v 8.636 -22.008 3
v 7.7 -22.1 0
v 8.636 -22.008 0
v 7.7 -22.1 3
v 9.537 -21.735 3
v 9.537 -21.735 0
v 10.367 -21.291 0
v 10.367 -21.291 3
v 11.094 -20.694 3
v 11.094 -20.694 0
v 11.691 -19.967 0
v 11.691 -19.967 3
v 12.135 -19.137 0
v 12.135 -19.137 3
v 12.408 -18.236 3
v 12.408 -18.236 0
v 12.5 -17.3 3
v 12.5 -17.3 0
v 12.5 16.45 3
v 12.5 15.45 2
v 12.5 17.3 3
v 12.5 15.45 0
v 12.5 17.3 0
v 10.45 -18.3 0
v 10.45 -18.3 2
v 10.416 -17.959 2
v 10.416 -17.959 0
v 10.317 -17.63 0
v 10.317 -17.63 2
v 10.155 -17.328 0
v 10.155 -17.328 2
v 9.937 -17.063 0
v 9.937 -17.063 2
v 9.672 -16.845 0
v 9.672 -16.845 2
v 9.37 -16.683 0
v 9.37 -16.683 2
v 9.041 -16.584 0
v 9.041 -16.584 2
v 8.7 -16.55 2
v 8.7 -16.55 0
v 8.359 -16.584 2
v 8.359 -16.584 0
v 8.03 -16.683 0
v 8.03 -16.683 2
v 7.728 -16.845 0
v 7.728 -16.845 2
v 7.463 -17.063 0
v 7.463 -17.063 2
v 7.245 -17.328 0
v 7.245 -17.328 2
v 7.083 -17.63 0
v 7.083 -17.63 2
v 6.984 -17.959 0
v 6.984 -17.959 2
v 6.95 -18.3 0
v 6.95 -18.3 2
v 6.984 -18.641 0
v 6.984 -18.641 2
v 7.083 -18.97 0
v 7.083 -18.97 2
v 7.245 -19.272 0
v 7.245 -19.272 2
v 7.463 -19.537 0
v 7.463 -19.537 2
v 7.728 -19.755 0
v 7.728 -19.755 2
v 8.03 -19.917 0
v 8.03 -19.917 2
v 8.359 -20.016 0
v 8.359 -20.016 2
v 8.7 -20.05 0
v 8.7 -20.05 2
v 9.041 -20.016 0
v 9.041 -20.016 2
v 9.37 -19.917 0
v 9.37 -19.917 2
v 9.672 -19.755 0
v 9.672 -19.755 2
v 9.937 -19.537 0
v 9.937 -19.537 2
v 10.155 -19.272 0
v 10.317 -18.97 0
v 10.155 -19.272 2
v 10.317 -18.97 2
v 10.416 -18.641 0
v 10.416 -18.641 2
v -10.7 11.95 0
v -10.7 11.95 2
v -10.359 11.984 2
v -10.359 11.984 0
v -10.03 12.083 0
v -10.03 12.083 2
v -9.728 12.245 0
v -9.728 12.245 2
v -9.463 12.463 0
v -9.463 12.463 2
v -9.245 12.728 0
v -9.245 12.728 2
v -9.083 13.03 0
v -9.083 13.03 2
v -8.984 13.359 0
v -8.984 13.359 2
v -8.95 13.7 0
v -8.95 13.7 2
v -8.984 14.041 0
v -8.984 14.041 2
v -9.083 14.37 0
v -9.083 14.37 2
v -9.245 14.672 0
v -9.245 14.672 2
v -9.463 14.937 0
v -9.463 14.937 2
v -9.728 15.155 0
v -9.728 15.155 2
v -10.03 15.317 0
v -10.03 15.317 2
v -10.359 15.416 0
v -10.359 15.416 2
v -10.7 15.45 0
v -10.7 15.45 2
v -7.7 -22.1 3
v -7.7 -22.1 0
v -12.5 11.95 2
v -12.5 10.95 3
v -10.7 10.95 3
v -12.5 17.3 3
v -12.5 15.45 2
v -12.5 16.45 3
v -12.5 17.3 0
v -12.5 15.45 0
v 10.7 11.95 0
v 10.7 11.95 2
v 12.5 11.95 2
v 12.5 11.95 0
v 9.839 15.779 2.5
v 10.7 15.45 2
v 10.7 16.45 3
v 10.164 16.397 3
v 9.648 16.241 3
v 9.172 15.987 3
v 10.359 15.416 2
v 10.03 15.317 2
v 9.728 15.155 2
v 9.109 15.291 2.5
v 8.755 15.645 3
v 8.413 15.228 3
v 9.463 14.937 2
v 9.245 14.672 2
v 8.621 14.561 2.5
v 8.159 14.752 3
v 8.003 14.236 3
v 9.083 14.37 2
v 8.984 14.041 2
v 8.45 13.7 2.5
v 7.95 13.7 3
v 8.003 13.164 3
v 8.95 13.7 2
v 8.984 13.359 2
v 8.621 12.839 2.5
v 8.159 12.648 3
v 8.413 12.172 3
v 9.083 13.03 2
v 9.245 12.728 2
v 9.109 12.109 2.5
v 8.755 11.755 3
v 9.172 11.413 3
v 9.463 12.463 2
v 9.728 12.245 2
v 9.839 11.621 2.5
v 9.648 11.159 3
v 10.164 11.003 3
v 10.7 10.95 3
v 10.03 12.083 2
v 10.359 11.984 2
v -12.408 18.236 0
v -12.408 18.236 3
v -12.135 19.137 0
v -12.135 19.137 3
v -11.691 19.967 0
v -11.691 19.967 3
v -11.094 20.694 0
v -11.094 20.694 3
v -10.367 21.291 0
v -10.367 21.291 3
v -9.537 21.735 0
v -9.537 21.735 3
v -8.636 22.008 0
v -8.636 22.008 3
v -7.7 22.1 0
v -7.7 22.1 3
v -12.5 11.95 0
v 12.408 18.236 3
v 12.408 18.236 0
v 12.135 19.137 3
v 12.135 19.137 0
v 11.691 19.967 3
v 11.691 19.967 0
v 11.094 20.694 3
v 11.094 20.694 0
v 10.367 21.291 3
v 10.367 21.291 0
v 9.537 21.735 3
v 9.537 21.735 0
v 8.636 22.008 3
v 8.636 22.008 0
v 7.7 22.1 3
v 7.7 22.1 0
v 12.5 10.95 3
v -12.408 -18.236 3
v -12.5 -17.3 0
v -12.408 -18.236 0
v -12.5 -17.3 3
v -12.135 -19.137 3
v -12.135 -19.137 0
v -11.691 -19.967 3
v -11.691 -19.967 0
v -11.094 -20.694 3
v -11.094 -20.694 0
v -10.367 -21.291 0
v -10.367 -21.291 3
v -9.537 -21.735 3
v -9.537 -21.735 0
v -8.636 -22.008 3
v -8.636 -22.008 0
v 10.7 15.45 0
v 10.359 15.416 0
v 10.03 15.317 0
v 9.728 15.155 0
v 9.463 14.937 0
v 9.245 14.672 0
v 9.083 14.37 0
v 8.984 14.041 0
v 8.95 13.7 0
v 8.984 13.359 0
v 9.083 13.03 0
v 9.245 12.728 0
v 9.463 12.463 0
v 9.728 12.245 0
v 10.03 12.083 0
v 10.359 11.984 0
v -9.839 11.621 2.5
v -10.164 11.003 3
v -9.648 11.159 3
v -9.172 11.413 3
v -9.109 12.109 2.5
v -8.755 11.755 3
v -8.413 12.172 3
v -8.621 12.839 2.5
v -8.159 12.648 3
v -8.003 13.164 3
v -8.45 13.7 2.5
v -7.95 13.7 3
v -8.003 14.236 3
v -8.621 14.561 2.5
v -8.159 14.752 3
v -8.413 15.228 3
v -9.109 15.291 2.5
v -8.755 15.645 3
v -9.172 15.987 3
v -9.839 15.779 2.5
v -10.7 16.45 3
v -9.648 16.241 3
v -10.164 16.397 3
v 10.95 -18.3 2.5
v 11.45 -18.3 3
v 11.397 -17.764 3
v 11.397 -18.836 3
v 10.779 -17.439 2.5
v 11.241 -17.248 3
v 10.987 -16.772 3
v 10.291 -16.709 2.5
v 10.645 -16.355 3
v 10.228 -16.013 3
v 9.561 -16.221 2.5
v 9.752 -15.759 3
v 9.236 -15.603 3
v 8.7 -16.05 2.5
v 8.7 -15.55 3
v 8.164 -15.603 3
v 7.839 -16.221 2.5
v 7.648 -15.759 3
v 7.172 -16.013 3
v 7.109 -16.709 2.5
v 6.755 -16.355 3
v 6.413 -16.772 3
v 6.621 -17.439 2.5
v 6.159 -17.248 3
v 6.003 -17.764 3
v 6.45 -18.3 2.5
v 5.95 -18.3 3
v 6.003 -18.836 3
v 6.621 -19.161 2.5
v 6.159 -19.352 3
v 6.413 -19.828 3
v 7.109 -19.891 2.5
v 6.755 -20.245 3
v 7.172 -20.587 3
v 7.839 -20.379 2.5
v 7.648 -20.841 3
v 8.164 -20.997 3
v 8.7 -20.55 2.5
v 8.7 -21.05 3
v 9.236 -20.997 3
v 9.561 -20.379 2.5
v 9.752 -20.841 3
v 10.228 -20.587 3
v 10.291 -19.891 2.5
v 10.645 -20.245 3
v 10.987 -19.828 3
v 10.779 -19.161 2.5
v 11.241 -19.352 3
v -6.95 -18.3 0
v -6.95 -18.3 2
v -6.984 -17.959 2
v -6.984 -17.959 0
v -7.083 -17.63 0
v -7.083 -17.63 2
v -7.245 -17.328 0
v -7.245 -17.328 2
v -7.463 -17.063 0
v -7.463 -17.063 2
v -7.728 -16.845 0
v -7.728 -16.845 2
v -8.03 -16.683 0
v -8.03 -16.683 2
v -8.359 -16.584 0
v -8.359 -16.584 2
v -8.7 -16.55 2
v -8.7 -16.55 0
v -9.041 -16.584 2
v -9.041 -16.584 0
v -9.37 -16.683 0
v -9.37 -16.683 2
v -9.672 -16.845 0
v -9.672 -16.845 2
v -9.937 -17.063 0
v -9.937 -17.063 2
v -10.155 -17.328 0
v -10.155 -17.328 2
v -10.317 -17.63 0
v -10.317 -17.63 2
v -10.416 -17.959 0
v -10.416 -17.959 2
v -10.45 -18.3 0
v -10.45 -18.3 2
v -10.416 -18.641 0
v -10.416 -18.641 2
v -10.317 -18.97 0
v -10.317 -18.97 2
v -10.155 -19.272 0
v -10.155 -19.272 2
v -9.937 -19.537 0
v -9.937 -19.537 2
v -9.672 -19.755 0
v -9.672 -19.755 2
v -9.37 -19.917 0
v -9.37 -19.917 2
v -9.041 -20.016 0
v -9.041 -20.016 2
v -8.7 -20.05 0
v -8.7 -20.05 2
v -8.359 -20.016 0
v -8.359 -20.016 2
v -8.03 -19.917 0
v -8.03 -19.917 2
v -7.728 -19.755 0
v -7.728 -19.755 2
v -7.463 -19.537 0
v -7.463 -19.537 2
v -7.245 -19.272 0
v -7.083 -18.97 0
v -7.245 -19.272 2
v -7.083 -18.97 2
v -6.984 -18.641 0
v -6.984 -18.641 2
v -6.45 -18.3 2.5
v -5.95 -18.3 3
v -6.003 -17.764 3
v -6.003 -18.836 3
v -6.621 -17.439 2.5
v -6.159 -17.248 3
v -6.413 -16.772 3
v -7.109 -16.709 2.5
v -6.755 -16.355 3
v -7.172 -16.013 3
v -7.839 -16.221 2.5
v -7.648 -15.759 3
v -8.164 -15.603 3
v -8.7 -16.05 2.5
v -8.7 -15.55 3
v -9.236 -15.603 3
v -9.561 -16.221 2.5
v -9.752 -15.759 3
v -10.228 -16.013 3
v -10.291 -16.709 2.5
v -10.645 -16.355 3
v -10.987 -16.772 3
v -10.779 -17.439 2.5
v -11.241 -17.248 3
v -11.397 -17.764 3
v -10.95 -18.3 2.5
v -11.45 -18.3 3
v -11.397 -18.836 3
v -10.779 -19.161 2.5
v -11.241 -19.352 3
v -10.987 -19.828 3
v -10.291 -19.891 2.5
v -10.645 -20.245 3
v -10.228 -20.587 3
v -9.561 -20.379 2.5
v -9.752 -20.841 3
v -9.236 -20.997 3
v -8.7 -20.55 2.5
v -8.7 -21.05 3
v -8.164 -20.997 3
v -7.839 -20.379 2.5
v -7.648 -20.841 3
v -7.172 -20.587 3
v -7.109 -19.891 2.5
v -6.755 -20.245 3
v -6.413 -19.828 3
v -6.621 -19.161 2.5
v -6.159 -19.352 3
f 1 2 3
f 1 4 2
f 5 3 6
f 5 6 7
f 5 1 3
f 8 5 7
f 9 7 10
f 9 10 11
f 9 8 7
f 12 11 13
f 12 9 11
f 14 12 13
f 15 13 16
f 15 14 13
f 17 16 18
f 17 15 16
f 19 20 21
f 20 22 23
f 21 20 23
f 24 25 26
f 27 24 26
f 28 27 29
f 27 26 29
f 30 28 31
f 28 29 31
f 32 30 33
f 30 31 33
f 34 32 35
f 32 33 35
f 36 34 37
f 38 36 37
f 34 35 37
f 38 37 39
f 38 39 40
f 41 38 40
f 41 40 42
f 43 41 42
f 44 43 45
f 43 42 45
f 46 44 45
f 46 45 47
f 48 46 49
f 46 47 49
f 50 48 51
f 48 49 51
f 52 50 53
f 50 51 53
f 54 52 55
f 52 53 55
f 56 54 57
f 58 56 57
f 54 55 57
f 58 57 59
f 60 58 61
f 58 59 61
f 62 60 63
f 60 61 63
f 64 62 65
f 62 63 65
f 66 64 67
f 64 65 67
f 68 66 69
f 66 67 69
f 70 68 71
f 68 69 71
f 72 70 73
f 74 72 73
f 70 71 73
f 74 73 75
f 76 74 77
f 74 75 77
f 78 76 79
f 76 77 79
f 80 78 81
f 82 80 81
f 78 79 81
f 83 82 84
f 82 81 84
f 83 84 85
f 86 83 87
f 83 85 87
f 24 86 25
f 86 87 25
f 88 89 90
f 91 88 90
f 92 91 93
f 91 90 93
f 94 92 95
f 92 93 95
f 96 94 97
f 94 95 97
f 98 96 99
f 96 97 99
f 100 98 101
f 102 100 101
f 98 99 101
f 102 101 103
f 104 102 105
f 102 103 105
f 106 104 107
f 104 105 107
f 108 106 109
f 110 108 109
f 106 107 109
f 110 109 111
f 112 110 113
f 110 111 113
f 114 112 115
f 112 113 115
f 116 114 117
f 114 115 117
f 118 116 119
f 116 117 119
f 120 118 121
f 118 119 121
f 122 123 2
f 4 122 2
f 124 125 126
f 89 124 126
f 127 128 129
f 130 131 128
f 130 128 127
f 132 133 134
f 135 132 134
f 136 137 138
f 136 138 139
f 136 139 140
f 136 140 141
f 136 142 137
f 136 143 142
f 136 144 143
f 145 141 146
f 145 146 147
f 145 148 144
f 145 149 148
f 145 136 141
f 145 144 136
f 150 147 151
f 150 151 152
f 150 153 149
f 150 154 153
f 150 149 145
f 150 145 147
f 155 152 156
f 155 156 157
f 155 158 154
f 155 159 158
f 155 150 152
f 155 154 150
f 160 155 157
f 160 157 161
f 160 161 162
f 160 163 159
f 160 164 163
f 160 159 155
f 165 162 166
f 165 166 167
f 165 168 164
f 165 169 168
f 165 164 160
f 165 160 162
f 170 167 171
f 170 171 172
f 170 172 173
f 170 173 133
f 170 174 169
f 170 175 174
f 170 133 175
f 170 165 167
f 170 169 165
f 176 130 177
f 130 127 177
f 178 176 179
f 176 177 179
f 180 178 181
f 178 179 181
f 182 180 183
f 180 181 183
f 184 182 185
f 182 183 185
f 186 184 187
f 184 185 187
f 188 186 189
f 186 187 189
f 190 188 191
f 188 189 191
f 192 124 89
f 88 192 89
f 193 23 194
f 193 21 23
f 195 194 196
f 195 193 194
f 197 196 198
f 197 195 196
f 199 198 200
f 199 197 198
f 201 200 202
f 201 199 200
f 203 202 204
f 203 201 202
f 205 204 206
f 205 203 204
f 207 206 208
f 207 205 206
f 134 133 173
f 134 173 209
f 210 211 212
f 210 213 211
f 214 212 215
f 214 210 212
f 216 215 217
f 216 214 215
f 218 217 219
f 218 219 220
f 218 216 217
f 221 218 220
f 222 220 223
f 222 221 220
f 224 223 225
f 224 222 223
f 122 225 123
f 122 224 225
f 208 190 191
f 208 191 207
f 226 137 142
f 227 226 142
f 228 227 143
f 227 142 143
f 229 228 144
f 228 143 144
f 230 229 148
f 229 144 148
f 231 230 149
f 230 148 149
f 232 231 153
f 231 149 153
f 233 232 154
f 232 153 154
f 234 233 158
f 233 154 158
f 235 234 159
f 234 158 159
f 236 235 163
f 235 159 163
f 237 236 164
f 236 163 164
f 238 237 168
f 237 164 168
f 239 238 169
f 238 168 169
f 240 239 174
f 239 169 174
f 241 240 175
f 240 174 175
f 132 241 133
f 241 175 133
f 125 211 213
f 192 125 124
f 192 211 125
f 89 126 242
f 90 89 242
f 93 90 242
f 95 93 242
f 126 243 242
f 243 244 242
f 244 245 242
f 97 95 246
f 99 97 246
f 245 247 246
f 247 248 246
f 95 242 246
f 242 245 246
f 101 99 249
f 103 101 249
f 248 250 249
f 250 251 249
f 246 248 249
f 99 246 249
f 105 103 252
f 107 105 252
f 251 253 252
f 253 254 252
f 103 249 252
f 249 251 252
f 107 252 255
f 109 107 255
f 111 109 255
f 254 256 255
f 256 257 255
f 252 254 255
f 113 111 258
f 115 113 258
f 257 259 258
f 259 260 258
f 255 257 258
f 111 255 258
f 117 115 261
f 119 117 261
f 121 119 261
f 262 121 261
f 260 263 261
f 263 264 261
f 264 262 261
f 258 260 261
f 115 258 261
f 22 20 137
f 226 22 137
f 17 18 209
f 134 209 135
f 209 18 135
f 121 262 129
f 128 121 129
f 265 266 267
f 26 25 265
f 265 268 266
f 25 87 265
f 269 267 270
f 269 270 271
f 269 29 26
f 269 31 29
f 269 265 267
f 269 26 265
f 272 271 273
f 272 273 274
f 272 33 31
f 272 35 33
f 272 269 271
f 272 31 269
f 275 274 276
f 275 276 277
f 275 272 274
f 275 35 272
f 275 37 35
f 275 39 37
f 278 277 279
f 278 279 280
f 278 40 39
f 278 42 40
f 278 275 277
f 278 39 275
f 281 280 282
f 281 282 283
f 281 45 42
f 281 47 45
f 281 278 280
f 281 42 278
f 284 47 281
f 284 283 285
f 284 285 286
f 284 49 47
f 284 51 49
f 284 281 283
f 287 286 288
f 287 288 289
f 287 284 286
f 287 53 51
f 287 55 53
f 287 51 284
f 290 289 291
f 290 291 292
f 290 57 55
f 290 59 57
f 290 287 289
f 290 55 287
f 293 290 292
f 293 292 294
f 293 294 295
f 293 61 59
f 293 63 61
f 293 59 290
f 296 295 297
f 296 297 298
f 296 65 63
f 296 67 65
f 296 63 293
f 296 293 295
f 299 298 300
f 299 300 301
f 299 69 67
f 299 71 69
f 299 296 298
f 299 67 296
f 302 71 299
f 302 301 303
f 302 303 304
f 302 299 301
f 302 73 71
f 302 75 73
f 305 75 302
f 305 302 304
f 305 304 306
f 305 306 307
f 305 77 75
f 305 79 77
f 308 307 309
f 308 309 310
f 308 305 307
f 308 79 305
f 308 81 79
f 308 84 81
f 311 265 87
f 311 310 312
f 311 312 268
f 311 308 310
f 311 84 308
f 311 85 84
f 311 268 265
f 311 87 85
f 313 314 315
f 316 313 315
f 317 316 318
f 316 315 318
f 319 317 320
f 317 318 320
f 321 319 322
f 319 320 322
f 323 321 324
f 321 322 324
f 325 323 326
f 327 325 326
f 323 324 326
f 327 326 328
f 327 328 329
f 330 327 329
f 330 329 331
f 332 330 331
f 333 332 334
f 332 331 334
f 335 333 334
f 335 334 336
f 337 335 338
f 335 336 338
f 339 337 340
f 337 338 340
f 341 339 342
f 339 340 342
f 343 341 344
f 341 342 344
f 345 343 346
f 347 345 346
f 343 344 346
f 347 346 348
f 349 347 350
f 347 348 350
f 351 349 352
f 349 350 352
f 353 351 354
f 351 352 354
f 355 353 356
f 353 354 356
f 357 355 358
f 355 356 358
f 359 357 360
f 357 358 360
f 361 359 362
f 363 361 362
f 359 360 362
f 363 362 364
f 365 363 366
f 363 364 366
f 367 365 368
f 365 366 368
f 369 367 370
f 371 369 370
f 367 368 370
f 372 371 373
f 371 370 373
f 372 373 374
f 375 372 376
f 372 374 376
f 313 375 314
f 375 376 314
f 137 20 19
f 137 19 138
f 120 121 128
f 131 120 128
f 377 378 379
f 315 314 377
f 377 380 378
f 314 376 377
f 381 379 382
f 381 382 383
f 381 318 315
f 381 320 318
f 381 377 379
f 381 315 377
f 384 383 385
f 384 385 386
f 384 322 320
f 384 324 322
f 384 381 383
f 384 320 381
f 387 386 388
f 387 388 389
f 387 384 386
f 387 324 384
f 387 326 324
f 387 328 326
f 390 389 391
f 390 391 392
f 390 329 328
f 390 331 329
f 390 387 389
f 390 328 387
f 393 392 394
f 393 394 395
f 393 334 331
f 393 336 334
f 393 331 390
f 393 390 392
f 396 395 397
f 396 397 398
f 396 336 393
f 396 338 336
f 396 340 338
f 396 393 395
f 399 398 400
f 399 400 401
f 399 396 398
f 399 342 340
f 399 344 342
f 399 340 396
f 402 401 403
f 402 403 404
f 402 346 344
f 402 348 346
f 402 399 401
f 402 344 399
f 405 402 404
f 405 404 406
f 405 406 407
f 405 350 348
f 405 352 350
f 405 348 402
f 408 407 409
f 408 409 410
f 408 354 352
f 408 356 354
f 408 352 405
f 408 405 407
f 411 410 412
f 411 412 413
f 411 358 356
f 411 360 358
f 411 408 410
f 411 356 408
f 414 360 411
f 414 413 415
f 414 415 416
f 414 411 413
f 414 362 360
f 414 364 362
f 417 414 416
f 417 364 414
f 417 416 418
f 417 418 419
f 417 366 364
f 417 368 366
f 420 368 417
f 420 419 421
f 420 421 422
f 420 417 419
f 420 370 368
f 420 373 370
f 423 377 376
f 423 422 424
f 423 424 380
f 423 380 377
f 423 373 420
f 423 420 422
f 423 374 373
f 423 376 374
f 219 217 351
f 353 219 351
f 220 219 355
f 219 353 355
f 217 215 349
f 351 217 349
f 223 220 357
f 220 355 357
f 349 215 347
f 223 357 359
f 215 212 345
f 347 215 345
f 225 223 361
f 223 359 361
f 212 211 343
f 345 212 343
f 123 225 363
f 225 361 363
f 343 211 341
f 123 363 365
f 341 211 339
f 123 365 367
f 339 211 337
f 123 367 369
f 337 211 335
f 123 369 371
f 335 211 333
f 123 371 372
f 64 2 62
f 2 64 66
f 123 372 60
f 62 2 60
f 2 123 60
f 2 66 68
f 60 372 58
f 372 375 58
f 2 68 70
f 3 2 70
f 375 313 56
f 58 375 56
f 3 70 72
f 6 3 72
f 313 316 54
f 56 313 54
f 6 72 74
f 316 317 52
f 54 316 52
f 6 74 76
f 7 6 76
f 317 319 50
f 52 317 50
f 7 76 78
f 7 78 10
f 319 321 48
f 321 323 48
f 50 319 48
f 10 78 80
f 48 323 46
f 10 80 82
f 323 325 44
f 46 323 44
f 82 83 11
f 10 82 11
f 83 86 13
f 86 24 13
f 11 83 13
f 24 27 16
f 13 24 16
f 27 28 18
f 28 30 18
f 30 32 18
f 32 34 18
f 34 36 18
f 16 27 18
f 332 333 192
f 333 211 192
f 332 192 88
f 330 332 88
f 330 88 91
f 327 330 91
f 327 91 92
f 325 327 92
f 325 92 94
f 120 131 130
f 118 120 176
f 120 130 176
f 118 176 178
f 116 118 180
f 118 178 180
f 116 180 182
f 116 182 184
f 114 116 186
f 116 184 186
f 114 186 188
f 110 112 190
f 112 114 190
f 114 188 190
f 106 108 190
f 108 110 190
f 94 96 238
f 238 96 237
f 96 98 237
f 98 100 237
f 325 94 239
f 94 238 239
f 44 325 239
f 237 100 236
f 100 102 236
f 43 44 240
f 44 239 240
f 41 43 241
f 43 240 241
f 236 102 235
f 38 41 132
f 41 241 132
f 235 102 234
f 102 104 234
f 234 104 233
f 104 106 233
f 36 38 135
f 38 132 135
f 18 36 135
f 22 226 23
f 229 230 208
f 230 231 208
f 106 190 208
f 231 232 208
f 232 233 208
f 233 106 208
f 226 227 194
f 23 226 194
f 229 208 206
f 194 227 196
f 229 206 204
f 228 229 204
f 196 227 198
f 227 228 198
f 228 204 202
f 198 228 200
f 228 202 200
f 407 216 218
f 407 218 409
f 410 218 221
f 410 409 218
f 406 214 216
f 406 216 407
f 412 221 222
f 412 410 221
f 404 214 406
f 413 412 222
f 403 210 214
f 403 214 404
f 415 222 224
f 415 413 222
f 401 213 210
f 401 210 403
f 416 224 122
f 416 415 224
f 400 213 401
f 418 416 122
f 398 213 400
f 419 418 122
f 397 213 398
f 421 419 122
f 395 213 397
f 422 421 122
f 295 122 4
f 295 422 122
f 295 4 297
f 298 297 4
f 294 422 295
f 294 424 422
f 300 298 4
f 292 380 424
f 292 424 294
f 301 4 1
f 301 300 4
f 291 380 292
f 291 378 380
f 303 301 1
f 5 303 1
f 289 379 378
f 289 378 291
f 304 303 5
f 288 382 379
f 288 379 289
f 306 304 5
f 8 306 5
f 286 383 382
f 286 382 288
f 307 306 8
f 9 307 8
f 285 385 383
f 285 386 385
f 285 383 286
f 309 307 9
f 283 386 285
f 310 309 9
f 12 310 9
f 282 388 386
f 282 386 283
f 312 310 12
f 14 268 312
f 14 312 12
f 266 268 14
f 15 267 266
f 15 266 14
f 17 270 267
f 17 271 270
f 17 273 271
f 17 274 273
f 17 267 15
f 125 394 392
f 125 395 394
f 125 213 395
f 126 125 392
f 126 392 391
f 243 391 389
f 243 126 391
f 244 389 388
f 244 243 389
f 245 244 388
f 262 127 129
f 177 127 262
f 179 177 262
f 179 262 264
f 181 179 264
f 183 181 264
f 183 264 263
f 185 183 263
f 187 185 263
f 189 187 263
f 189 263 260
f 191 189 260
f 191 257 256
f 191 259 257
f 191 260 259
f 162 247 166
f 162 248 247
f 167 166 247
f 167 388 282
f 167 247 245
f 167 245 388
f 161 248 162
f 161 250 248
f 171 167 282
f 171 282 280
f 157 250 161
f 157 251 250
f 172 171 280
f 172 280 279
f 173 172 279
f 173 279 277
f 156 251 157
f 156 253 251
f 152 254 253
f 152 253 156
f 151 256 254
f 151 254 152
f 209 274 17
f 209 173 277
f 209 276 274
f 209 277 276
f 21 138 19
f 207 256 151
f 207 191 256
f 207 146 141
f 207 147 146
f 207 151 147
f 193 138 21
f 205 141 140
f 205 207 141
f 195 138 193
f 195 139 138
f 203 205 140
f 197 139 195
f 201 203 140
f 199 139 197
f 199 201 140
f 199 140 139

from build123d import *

# Parameters (mm, degrees)
SZKIC1_W                    = 25
SZKIC1_H                    = 44.2
DODANIE_WYCI_GNI_CIE1_DEPTH = 3
ZAOKR_GLENIE1_R             = 4.8
SZKIC2_R                    = 1.75
WYTNIJ_WYCI_GNI_CIE1_DEPTH  = 3
SFAZOWANIE1_SIZE            = 1


with BuildPart() as part:
    # Szkic1 → Dodanie-wyciągnięcie1 (new body)
    with BuildSketch(Plane.XY):
        Rectangle(SZKIC1_W, SZKIC1_H)
    extrude(amount=DODANIE_WYCI_GNI_CIE1_DEPTH)

    # Zaokrąglenie1
    zaokr_glenie1_edges = [part.edges().sort_by_distance(p)[0] for p in [
        (-12.5, 22.1, 1.5),
        (12.5, 22.1, 1.5),
        (12.5, -22.1, 1.5),
        (-12.5, -22.1, 1.5),
    ]]
    fillet(zaokr_glenie1_edges, radius=ZAOKR_GLENIE1_R)

    # Szkic2 → Wytnij-wyciągnięcie1 (cut)
    with BuildSketch(Plane.XY.offset(3)):
        with Locations((-8.7, -18.3)):
            Circle(SZKIC2_R)
        with Locations((8.7, -18.3)):
            Circle(SZKIC2_R)
        with BuildLine():
            Line((12.5, 11.95), (12.5, 15.45))
            Line((12.5, 15.45), (10.7, 15.45))
            ThreePointArc((10.7, 15.45), (11.937436867, 14.937436867), (12.45, 13.7))
            ThreePointArc((12.45, 13.7), (11.937436867, 12.462563133), (10.7, 11.95))
            Line((10.7, 11.95), (12.5, 11.95))
        make_face()
        with Locations((10.7, 13.7)):
            Circle(SZKIC2_R)
        with Locations((-10.7, 13.7)):
            Circle(SZKIC2_R)
        with BuildLine():
            ThreePointArc((-10.7, 11.95), (-12.45, 13.7), (-10.7, 15.45))
            Line((-10.7, 15.45), (-12.5, 15.45))
            Line((-12.5, 15.45), (-12.5, 11.95))
            Line((-12.5, 11.95), (-10.7, 11.95))
        make_face()
    extrude(amount=-WYTNIJ_WYCI_GNI_CIE1_DEPTH, mode=Mode.SUBTRACT)

    # Sfazowanie1
    sfazowanie1_edges = [part.edges().sort_by_distance(p)[0] for p in [
        (-11.6, 11.95, 3),
        (-8.95, 13.7, 3),
        (-11.6, 15.45, 3),
        (11.6, 11.95, 3),
        (11.6, 15.45, 3),
        (8.95, 13.7, 3),
        (6.95, -18.3, 3),
        (-10.45, -18.3, 3),
    ]]
    chamfer(sfazowanie1_edges, length=SFAZOWANIE1_SIZE)


solid = part.part
